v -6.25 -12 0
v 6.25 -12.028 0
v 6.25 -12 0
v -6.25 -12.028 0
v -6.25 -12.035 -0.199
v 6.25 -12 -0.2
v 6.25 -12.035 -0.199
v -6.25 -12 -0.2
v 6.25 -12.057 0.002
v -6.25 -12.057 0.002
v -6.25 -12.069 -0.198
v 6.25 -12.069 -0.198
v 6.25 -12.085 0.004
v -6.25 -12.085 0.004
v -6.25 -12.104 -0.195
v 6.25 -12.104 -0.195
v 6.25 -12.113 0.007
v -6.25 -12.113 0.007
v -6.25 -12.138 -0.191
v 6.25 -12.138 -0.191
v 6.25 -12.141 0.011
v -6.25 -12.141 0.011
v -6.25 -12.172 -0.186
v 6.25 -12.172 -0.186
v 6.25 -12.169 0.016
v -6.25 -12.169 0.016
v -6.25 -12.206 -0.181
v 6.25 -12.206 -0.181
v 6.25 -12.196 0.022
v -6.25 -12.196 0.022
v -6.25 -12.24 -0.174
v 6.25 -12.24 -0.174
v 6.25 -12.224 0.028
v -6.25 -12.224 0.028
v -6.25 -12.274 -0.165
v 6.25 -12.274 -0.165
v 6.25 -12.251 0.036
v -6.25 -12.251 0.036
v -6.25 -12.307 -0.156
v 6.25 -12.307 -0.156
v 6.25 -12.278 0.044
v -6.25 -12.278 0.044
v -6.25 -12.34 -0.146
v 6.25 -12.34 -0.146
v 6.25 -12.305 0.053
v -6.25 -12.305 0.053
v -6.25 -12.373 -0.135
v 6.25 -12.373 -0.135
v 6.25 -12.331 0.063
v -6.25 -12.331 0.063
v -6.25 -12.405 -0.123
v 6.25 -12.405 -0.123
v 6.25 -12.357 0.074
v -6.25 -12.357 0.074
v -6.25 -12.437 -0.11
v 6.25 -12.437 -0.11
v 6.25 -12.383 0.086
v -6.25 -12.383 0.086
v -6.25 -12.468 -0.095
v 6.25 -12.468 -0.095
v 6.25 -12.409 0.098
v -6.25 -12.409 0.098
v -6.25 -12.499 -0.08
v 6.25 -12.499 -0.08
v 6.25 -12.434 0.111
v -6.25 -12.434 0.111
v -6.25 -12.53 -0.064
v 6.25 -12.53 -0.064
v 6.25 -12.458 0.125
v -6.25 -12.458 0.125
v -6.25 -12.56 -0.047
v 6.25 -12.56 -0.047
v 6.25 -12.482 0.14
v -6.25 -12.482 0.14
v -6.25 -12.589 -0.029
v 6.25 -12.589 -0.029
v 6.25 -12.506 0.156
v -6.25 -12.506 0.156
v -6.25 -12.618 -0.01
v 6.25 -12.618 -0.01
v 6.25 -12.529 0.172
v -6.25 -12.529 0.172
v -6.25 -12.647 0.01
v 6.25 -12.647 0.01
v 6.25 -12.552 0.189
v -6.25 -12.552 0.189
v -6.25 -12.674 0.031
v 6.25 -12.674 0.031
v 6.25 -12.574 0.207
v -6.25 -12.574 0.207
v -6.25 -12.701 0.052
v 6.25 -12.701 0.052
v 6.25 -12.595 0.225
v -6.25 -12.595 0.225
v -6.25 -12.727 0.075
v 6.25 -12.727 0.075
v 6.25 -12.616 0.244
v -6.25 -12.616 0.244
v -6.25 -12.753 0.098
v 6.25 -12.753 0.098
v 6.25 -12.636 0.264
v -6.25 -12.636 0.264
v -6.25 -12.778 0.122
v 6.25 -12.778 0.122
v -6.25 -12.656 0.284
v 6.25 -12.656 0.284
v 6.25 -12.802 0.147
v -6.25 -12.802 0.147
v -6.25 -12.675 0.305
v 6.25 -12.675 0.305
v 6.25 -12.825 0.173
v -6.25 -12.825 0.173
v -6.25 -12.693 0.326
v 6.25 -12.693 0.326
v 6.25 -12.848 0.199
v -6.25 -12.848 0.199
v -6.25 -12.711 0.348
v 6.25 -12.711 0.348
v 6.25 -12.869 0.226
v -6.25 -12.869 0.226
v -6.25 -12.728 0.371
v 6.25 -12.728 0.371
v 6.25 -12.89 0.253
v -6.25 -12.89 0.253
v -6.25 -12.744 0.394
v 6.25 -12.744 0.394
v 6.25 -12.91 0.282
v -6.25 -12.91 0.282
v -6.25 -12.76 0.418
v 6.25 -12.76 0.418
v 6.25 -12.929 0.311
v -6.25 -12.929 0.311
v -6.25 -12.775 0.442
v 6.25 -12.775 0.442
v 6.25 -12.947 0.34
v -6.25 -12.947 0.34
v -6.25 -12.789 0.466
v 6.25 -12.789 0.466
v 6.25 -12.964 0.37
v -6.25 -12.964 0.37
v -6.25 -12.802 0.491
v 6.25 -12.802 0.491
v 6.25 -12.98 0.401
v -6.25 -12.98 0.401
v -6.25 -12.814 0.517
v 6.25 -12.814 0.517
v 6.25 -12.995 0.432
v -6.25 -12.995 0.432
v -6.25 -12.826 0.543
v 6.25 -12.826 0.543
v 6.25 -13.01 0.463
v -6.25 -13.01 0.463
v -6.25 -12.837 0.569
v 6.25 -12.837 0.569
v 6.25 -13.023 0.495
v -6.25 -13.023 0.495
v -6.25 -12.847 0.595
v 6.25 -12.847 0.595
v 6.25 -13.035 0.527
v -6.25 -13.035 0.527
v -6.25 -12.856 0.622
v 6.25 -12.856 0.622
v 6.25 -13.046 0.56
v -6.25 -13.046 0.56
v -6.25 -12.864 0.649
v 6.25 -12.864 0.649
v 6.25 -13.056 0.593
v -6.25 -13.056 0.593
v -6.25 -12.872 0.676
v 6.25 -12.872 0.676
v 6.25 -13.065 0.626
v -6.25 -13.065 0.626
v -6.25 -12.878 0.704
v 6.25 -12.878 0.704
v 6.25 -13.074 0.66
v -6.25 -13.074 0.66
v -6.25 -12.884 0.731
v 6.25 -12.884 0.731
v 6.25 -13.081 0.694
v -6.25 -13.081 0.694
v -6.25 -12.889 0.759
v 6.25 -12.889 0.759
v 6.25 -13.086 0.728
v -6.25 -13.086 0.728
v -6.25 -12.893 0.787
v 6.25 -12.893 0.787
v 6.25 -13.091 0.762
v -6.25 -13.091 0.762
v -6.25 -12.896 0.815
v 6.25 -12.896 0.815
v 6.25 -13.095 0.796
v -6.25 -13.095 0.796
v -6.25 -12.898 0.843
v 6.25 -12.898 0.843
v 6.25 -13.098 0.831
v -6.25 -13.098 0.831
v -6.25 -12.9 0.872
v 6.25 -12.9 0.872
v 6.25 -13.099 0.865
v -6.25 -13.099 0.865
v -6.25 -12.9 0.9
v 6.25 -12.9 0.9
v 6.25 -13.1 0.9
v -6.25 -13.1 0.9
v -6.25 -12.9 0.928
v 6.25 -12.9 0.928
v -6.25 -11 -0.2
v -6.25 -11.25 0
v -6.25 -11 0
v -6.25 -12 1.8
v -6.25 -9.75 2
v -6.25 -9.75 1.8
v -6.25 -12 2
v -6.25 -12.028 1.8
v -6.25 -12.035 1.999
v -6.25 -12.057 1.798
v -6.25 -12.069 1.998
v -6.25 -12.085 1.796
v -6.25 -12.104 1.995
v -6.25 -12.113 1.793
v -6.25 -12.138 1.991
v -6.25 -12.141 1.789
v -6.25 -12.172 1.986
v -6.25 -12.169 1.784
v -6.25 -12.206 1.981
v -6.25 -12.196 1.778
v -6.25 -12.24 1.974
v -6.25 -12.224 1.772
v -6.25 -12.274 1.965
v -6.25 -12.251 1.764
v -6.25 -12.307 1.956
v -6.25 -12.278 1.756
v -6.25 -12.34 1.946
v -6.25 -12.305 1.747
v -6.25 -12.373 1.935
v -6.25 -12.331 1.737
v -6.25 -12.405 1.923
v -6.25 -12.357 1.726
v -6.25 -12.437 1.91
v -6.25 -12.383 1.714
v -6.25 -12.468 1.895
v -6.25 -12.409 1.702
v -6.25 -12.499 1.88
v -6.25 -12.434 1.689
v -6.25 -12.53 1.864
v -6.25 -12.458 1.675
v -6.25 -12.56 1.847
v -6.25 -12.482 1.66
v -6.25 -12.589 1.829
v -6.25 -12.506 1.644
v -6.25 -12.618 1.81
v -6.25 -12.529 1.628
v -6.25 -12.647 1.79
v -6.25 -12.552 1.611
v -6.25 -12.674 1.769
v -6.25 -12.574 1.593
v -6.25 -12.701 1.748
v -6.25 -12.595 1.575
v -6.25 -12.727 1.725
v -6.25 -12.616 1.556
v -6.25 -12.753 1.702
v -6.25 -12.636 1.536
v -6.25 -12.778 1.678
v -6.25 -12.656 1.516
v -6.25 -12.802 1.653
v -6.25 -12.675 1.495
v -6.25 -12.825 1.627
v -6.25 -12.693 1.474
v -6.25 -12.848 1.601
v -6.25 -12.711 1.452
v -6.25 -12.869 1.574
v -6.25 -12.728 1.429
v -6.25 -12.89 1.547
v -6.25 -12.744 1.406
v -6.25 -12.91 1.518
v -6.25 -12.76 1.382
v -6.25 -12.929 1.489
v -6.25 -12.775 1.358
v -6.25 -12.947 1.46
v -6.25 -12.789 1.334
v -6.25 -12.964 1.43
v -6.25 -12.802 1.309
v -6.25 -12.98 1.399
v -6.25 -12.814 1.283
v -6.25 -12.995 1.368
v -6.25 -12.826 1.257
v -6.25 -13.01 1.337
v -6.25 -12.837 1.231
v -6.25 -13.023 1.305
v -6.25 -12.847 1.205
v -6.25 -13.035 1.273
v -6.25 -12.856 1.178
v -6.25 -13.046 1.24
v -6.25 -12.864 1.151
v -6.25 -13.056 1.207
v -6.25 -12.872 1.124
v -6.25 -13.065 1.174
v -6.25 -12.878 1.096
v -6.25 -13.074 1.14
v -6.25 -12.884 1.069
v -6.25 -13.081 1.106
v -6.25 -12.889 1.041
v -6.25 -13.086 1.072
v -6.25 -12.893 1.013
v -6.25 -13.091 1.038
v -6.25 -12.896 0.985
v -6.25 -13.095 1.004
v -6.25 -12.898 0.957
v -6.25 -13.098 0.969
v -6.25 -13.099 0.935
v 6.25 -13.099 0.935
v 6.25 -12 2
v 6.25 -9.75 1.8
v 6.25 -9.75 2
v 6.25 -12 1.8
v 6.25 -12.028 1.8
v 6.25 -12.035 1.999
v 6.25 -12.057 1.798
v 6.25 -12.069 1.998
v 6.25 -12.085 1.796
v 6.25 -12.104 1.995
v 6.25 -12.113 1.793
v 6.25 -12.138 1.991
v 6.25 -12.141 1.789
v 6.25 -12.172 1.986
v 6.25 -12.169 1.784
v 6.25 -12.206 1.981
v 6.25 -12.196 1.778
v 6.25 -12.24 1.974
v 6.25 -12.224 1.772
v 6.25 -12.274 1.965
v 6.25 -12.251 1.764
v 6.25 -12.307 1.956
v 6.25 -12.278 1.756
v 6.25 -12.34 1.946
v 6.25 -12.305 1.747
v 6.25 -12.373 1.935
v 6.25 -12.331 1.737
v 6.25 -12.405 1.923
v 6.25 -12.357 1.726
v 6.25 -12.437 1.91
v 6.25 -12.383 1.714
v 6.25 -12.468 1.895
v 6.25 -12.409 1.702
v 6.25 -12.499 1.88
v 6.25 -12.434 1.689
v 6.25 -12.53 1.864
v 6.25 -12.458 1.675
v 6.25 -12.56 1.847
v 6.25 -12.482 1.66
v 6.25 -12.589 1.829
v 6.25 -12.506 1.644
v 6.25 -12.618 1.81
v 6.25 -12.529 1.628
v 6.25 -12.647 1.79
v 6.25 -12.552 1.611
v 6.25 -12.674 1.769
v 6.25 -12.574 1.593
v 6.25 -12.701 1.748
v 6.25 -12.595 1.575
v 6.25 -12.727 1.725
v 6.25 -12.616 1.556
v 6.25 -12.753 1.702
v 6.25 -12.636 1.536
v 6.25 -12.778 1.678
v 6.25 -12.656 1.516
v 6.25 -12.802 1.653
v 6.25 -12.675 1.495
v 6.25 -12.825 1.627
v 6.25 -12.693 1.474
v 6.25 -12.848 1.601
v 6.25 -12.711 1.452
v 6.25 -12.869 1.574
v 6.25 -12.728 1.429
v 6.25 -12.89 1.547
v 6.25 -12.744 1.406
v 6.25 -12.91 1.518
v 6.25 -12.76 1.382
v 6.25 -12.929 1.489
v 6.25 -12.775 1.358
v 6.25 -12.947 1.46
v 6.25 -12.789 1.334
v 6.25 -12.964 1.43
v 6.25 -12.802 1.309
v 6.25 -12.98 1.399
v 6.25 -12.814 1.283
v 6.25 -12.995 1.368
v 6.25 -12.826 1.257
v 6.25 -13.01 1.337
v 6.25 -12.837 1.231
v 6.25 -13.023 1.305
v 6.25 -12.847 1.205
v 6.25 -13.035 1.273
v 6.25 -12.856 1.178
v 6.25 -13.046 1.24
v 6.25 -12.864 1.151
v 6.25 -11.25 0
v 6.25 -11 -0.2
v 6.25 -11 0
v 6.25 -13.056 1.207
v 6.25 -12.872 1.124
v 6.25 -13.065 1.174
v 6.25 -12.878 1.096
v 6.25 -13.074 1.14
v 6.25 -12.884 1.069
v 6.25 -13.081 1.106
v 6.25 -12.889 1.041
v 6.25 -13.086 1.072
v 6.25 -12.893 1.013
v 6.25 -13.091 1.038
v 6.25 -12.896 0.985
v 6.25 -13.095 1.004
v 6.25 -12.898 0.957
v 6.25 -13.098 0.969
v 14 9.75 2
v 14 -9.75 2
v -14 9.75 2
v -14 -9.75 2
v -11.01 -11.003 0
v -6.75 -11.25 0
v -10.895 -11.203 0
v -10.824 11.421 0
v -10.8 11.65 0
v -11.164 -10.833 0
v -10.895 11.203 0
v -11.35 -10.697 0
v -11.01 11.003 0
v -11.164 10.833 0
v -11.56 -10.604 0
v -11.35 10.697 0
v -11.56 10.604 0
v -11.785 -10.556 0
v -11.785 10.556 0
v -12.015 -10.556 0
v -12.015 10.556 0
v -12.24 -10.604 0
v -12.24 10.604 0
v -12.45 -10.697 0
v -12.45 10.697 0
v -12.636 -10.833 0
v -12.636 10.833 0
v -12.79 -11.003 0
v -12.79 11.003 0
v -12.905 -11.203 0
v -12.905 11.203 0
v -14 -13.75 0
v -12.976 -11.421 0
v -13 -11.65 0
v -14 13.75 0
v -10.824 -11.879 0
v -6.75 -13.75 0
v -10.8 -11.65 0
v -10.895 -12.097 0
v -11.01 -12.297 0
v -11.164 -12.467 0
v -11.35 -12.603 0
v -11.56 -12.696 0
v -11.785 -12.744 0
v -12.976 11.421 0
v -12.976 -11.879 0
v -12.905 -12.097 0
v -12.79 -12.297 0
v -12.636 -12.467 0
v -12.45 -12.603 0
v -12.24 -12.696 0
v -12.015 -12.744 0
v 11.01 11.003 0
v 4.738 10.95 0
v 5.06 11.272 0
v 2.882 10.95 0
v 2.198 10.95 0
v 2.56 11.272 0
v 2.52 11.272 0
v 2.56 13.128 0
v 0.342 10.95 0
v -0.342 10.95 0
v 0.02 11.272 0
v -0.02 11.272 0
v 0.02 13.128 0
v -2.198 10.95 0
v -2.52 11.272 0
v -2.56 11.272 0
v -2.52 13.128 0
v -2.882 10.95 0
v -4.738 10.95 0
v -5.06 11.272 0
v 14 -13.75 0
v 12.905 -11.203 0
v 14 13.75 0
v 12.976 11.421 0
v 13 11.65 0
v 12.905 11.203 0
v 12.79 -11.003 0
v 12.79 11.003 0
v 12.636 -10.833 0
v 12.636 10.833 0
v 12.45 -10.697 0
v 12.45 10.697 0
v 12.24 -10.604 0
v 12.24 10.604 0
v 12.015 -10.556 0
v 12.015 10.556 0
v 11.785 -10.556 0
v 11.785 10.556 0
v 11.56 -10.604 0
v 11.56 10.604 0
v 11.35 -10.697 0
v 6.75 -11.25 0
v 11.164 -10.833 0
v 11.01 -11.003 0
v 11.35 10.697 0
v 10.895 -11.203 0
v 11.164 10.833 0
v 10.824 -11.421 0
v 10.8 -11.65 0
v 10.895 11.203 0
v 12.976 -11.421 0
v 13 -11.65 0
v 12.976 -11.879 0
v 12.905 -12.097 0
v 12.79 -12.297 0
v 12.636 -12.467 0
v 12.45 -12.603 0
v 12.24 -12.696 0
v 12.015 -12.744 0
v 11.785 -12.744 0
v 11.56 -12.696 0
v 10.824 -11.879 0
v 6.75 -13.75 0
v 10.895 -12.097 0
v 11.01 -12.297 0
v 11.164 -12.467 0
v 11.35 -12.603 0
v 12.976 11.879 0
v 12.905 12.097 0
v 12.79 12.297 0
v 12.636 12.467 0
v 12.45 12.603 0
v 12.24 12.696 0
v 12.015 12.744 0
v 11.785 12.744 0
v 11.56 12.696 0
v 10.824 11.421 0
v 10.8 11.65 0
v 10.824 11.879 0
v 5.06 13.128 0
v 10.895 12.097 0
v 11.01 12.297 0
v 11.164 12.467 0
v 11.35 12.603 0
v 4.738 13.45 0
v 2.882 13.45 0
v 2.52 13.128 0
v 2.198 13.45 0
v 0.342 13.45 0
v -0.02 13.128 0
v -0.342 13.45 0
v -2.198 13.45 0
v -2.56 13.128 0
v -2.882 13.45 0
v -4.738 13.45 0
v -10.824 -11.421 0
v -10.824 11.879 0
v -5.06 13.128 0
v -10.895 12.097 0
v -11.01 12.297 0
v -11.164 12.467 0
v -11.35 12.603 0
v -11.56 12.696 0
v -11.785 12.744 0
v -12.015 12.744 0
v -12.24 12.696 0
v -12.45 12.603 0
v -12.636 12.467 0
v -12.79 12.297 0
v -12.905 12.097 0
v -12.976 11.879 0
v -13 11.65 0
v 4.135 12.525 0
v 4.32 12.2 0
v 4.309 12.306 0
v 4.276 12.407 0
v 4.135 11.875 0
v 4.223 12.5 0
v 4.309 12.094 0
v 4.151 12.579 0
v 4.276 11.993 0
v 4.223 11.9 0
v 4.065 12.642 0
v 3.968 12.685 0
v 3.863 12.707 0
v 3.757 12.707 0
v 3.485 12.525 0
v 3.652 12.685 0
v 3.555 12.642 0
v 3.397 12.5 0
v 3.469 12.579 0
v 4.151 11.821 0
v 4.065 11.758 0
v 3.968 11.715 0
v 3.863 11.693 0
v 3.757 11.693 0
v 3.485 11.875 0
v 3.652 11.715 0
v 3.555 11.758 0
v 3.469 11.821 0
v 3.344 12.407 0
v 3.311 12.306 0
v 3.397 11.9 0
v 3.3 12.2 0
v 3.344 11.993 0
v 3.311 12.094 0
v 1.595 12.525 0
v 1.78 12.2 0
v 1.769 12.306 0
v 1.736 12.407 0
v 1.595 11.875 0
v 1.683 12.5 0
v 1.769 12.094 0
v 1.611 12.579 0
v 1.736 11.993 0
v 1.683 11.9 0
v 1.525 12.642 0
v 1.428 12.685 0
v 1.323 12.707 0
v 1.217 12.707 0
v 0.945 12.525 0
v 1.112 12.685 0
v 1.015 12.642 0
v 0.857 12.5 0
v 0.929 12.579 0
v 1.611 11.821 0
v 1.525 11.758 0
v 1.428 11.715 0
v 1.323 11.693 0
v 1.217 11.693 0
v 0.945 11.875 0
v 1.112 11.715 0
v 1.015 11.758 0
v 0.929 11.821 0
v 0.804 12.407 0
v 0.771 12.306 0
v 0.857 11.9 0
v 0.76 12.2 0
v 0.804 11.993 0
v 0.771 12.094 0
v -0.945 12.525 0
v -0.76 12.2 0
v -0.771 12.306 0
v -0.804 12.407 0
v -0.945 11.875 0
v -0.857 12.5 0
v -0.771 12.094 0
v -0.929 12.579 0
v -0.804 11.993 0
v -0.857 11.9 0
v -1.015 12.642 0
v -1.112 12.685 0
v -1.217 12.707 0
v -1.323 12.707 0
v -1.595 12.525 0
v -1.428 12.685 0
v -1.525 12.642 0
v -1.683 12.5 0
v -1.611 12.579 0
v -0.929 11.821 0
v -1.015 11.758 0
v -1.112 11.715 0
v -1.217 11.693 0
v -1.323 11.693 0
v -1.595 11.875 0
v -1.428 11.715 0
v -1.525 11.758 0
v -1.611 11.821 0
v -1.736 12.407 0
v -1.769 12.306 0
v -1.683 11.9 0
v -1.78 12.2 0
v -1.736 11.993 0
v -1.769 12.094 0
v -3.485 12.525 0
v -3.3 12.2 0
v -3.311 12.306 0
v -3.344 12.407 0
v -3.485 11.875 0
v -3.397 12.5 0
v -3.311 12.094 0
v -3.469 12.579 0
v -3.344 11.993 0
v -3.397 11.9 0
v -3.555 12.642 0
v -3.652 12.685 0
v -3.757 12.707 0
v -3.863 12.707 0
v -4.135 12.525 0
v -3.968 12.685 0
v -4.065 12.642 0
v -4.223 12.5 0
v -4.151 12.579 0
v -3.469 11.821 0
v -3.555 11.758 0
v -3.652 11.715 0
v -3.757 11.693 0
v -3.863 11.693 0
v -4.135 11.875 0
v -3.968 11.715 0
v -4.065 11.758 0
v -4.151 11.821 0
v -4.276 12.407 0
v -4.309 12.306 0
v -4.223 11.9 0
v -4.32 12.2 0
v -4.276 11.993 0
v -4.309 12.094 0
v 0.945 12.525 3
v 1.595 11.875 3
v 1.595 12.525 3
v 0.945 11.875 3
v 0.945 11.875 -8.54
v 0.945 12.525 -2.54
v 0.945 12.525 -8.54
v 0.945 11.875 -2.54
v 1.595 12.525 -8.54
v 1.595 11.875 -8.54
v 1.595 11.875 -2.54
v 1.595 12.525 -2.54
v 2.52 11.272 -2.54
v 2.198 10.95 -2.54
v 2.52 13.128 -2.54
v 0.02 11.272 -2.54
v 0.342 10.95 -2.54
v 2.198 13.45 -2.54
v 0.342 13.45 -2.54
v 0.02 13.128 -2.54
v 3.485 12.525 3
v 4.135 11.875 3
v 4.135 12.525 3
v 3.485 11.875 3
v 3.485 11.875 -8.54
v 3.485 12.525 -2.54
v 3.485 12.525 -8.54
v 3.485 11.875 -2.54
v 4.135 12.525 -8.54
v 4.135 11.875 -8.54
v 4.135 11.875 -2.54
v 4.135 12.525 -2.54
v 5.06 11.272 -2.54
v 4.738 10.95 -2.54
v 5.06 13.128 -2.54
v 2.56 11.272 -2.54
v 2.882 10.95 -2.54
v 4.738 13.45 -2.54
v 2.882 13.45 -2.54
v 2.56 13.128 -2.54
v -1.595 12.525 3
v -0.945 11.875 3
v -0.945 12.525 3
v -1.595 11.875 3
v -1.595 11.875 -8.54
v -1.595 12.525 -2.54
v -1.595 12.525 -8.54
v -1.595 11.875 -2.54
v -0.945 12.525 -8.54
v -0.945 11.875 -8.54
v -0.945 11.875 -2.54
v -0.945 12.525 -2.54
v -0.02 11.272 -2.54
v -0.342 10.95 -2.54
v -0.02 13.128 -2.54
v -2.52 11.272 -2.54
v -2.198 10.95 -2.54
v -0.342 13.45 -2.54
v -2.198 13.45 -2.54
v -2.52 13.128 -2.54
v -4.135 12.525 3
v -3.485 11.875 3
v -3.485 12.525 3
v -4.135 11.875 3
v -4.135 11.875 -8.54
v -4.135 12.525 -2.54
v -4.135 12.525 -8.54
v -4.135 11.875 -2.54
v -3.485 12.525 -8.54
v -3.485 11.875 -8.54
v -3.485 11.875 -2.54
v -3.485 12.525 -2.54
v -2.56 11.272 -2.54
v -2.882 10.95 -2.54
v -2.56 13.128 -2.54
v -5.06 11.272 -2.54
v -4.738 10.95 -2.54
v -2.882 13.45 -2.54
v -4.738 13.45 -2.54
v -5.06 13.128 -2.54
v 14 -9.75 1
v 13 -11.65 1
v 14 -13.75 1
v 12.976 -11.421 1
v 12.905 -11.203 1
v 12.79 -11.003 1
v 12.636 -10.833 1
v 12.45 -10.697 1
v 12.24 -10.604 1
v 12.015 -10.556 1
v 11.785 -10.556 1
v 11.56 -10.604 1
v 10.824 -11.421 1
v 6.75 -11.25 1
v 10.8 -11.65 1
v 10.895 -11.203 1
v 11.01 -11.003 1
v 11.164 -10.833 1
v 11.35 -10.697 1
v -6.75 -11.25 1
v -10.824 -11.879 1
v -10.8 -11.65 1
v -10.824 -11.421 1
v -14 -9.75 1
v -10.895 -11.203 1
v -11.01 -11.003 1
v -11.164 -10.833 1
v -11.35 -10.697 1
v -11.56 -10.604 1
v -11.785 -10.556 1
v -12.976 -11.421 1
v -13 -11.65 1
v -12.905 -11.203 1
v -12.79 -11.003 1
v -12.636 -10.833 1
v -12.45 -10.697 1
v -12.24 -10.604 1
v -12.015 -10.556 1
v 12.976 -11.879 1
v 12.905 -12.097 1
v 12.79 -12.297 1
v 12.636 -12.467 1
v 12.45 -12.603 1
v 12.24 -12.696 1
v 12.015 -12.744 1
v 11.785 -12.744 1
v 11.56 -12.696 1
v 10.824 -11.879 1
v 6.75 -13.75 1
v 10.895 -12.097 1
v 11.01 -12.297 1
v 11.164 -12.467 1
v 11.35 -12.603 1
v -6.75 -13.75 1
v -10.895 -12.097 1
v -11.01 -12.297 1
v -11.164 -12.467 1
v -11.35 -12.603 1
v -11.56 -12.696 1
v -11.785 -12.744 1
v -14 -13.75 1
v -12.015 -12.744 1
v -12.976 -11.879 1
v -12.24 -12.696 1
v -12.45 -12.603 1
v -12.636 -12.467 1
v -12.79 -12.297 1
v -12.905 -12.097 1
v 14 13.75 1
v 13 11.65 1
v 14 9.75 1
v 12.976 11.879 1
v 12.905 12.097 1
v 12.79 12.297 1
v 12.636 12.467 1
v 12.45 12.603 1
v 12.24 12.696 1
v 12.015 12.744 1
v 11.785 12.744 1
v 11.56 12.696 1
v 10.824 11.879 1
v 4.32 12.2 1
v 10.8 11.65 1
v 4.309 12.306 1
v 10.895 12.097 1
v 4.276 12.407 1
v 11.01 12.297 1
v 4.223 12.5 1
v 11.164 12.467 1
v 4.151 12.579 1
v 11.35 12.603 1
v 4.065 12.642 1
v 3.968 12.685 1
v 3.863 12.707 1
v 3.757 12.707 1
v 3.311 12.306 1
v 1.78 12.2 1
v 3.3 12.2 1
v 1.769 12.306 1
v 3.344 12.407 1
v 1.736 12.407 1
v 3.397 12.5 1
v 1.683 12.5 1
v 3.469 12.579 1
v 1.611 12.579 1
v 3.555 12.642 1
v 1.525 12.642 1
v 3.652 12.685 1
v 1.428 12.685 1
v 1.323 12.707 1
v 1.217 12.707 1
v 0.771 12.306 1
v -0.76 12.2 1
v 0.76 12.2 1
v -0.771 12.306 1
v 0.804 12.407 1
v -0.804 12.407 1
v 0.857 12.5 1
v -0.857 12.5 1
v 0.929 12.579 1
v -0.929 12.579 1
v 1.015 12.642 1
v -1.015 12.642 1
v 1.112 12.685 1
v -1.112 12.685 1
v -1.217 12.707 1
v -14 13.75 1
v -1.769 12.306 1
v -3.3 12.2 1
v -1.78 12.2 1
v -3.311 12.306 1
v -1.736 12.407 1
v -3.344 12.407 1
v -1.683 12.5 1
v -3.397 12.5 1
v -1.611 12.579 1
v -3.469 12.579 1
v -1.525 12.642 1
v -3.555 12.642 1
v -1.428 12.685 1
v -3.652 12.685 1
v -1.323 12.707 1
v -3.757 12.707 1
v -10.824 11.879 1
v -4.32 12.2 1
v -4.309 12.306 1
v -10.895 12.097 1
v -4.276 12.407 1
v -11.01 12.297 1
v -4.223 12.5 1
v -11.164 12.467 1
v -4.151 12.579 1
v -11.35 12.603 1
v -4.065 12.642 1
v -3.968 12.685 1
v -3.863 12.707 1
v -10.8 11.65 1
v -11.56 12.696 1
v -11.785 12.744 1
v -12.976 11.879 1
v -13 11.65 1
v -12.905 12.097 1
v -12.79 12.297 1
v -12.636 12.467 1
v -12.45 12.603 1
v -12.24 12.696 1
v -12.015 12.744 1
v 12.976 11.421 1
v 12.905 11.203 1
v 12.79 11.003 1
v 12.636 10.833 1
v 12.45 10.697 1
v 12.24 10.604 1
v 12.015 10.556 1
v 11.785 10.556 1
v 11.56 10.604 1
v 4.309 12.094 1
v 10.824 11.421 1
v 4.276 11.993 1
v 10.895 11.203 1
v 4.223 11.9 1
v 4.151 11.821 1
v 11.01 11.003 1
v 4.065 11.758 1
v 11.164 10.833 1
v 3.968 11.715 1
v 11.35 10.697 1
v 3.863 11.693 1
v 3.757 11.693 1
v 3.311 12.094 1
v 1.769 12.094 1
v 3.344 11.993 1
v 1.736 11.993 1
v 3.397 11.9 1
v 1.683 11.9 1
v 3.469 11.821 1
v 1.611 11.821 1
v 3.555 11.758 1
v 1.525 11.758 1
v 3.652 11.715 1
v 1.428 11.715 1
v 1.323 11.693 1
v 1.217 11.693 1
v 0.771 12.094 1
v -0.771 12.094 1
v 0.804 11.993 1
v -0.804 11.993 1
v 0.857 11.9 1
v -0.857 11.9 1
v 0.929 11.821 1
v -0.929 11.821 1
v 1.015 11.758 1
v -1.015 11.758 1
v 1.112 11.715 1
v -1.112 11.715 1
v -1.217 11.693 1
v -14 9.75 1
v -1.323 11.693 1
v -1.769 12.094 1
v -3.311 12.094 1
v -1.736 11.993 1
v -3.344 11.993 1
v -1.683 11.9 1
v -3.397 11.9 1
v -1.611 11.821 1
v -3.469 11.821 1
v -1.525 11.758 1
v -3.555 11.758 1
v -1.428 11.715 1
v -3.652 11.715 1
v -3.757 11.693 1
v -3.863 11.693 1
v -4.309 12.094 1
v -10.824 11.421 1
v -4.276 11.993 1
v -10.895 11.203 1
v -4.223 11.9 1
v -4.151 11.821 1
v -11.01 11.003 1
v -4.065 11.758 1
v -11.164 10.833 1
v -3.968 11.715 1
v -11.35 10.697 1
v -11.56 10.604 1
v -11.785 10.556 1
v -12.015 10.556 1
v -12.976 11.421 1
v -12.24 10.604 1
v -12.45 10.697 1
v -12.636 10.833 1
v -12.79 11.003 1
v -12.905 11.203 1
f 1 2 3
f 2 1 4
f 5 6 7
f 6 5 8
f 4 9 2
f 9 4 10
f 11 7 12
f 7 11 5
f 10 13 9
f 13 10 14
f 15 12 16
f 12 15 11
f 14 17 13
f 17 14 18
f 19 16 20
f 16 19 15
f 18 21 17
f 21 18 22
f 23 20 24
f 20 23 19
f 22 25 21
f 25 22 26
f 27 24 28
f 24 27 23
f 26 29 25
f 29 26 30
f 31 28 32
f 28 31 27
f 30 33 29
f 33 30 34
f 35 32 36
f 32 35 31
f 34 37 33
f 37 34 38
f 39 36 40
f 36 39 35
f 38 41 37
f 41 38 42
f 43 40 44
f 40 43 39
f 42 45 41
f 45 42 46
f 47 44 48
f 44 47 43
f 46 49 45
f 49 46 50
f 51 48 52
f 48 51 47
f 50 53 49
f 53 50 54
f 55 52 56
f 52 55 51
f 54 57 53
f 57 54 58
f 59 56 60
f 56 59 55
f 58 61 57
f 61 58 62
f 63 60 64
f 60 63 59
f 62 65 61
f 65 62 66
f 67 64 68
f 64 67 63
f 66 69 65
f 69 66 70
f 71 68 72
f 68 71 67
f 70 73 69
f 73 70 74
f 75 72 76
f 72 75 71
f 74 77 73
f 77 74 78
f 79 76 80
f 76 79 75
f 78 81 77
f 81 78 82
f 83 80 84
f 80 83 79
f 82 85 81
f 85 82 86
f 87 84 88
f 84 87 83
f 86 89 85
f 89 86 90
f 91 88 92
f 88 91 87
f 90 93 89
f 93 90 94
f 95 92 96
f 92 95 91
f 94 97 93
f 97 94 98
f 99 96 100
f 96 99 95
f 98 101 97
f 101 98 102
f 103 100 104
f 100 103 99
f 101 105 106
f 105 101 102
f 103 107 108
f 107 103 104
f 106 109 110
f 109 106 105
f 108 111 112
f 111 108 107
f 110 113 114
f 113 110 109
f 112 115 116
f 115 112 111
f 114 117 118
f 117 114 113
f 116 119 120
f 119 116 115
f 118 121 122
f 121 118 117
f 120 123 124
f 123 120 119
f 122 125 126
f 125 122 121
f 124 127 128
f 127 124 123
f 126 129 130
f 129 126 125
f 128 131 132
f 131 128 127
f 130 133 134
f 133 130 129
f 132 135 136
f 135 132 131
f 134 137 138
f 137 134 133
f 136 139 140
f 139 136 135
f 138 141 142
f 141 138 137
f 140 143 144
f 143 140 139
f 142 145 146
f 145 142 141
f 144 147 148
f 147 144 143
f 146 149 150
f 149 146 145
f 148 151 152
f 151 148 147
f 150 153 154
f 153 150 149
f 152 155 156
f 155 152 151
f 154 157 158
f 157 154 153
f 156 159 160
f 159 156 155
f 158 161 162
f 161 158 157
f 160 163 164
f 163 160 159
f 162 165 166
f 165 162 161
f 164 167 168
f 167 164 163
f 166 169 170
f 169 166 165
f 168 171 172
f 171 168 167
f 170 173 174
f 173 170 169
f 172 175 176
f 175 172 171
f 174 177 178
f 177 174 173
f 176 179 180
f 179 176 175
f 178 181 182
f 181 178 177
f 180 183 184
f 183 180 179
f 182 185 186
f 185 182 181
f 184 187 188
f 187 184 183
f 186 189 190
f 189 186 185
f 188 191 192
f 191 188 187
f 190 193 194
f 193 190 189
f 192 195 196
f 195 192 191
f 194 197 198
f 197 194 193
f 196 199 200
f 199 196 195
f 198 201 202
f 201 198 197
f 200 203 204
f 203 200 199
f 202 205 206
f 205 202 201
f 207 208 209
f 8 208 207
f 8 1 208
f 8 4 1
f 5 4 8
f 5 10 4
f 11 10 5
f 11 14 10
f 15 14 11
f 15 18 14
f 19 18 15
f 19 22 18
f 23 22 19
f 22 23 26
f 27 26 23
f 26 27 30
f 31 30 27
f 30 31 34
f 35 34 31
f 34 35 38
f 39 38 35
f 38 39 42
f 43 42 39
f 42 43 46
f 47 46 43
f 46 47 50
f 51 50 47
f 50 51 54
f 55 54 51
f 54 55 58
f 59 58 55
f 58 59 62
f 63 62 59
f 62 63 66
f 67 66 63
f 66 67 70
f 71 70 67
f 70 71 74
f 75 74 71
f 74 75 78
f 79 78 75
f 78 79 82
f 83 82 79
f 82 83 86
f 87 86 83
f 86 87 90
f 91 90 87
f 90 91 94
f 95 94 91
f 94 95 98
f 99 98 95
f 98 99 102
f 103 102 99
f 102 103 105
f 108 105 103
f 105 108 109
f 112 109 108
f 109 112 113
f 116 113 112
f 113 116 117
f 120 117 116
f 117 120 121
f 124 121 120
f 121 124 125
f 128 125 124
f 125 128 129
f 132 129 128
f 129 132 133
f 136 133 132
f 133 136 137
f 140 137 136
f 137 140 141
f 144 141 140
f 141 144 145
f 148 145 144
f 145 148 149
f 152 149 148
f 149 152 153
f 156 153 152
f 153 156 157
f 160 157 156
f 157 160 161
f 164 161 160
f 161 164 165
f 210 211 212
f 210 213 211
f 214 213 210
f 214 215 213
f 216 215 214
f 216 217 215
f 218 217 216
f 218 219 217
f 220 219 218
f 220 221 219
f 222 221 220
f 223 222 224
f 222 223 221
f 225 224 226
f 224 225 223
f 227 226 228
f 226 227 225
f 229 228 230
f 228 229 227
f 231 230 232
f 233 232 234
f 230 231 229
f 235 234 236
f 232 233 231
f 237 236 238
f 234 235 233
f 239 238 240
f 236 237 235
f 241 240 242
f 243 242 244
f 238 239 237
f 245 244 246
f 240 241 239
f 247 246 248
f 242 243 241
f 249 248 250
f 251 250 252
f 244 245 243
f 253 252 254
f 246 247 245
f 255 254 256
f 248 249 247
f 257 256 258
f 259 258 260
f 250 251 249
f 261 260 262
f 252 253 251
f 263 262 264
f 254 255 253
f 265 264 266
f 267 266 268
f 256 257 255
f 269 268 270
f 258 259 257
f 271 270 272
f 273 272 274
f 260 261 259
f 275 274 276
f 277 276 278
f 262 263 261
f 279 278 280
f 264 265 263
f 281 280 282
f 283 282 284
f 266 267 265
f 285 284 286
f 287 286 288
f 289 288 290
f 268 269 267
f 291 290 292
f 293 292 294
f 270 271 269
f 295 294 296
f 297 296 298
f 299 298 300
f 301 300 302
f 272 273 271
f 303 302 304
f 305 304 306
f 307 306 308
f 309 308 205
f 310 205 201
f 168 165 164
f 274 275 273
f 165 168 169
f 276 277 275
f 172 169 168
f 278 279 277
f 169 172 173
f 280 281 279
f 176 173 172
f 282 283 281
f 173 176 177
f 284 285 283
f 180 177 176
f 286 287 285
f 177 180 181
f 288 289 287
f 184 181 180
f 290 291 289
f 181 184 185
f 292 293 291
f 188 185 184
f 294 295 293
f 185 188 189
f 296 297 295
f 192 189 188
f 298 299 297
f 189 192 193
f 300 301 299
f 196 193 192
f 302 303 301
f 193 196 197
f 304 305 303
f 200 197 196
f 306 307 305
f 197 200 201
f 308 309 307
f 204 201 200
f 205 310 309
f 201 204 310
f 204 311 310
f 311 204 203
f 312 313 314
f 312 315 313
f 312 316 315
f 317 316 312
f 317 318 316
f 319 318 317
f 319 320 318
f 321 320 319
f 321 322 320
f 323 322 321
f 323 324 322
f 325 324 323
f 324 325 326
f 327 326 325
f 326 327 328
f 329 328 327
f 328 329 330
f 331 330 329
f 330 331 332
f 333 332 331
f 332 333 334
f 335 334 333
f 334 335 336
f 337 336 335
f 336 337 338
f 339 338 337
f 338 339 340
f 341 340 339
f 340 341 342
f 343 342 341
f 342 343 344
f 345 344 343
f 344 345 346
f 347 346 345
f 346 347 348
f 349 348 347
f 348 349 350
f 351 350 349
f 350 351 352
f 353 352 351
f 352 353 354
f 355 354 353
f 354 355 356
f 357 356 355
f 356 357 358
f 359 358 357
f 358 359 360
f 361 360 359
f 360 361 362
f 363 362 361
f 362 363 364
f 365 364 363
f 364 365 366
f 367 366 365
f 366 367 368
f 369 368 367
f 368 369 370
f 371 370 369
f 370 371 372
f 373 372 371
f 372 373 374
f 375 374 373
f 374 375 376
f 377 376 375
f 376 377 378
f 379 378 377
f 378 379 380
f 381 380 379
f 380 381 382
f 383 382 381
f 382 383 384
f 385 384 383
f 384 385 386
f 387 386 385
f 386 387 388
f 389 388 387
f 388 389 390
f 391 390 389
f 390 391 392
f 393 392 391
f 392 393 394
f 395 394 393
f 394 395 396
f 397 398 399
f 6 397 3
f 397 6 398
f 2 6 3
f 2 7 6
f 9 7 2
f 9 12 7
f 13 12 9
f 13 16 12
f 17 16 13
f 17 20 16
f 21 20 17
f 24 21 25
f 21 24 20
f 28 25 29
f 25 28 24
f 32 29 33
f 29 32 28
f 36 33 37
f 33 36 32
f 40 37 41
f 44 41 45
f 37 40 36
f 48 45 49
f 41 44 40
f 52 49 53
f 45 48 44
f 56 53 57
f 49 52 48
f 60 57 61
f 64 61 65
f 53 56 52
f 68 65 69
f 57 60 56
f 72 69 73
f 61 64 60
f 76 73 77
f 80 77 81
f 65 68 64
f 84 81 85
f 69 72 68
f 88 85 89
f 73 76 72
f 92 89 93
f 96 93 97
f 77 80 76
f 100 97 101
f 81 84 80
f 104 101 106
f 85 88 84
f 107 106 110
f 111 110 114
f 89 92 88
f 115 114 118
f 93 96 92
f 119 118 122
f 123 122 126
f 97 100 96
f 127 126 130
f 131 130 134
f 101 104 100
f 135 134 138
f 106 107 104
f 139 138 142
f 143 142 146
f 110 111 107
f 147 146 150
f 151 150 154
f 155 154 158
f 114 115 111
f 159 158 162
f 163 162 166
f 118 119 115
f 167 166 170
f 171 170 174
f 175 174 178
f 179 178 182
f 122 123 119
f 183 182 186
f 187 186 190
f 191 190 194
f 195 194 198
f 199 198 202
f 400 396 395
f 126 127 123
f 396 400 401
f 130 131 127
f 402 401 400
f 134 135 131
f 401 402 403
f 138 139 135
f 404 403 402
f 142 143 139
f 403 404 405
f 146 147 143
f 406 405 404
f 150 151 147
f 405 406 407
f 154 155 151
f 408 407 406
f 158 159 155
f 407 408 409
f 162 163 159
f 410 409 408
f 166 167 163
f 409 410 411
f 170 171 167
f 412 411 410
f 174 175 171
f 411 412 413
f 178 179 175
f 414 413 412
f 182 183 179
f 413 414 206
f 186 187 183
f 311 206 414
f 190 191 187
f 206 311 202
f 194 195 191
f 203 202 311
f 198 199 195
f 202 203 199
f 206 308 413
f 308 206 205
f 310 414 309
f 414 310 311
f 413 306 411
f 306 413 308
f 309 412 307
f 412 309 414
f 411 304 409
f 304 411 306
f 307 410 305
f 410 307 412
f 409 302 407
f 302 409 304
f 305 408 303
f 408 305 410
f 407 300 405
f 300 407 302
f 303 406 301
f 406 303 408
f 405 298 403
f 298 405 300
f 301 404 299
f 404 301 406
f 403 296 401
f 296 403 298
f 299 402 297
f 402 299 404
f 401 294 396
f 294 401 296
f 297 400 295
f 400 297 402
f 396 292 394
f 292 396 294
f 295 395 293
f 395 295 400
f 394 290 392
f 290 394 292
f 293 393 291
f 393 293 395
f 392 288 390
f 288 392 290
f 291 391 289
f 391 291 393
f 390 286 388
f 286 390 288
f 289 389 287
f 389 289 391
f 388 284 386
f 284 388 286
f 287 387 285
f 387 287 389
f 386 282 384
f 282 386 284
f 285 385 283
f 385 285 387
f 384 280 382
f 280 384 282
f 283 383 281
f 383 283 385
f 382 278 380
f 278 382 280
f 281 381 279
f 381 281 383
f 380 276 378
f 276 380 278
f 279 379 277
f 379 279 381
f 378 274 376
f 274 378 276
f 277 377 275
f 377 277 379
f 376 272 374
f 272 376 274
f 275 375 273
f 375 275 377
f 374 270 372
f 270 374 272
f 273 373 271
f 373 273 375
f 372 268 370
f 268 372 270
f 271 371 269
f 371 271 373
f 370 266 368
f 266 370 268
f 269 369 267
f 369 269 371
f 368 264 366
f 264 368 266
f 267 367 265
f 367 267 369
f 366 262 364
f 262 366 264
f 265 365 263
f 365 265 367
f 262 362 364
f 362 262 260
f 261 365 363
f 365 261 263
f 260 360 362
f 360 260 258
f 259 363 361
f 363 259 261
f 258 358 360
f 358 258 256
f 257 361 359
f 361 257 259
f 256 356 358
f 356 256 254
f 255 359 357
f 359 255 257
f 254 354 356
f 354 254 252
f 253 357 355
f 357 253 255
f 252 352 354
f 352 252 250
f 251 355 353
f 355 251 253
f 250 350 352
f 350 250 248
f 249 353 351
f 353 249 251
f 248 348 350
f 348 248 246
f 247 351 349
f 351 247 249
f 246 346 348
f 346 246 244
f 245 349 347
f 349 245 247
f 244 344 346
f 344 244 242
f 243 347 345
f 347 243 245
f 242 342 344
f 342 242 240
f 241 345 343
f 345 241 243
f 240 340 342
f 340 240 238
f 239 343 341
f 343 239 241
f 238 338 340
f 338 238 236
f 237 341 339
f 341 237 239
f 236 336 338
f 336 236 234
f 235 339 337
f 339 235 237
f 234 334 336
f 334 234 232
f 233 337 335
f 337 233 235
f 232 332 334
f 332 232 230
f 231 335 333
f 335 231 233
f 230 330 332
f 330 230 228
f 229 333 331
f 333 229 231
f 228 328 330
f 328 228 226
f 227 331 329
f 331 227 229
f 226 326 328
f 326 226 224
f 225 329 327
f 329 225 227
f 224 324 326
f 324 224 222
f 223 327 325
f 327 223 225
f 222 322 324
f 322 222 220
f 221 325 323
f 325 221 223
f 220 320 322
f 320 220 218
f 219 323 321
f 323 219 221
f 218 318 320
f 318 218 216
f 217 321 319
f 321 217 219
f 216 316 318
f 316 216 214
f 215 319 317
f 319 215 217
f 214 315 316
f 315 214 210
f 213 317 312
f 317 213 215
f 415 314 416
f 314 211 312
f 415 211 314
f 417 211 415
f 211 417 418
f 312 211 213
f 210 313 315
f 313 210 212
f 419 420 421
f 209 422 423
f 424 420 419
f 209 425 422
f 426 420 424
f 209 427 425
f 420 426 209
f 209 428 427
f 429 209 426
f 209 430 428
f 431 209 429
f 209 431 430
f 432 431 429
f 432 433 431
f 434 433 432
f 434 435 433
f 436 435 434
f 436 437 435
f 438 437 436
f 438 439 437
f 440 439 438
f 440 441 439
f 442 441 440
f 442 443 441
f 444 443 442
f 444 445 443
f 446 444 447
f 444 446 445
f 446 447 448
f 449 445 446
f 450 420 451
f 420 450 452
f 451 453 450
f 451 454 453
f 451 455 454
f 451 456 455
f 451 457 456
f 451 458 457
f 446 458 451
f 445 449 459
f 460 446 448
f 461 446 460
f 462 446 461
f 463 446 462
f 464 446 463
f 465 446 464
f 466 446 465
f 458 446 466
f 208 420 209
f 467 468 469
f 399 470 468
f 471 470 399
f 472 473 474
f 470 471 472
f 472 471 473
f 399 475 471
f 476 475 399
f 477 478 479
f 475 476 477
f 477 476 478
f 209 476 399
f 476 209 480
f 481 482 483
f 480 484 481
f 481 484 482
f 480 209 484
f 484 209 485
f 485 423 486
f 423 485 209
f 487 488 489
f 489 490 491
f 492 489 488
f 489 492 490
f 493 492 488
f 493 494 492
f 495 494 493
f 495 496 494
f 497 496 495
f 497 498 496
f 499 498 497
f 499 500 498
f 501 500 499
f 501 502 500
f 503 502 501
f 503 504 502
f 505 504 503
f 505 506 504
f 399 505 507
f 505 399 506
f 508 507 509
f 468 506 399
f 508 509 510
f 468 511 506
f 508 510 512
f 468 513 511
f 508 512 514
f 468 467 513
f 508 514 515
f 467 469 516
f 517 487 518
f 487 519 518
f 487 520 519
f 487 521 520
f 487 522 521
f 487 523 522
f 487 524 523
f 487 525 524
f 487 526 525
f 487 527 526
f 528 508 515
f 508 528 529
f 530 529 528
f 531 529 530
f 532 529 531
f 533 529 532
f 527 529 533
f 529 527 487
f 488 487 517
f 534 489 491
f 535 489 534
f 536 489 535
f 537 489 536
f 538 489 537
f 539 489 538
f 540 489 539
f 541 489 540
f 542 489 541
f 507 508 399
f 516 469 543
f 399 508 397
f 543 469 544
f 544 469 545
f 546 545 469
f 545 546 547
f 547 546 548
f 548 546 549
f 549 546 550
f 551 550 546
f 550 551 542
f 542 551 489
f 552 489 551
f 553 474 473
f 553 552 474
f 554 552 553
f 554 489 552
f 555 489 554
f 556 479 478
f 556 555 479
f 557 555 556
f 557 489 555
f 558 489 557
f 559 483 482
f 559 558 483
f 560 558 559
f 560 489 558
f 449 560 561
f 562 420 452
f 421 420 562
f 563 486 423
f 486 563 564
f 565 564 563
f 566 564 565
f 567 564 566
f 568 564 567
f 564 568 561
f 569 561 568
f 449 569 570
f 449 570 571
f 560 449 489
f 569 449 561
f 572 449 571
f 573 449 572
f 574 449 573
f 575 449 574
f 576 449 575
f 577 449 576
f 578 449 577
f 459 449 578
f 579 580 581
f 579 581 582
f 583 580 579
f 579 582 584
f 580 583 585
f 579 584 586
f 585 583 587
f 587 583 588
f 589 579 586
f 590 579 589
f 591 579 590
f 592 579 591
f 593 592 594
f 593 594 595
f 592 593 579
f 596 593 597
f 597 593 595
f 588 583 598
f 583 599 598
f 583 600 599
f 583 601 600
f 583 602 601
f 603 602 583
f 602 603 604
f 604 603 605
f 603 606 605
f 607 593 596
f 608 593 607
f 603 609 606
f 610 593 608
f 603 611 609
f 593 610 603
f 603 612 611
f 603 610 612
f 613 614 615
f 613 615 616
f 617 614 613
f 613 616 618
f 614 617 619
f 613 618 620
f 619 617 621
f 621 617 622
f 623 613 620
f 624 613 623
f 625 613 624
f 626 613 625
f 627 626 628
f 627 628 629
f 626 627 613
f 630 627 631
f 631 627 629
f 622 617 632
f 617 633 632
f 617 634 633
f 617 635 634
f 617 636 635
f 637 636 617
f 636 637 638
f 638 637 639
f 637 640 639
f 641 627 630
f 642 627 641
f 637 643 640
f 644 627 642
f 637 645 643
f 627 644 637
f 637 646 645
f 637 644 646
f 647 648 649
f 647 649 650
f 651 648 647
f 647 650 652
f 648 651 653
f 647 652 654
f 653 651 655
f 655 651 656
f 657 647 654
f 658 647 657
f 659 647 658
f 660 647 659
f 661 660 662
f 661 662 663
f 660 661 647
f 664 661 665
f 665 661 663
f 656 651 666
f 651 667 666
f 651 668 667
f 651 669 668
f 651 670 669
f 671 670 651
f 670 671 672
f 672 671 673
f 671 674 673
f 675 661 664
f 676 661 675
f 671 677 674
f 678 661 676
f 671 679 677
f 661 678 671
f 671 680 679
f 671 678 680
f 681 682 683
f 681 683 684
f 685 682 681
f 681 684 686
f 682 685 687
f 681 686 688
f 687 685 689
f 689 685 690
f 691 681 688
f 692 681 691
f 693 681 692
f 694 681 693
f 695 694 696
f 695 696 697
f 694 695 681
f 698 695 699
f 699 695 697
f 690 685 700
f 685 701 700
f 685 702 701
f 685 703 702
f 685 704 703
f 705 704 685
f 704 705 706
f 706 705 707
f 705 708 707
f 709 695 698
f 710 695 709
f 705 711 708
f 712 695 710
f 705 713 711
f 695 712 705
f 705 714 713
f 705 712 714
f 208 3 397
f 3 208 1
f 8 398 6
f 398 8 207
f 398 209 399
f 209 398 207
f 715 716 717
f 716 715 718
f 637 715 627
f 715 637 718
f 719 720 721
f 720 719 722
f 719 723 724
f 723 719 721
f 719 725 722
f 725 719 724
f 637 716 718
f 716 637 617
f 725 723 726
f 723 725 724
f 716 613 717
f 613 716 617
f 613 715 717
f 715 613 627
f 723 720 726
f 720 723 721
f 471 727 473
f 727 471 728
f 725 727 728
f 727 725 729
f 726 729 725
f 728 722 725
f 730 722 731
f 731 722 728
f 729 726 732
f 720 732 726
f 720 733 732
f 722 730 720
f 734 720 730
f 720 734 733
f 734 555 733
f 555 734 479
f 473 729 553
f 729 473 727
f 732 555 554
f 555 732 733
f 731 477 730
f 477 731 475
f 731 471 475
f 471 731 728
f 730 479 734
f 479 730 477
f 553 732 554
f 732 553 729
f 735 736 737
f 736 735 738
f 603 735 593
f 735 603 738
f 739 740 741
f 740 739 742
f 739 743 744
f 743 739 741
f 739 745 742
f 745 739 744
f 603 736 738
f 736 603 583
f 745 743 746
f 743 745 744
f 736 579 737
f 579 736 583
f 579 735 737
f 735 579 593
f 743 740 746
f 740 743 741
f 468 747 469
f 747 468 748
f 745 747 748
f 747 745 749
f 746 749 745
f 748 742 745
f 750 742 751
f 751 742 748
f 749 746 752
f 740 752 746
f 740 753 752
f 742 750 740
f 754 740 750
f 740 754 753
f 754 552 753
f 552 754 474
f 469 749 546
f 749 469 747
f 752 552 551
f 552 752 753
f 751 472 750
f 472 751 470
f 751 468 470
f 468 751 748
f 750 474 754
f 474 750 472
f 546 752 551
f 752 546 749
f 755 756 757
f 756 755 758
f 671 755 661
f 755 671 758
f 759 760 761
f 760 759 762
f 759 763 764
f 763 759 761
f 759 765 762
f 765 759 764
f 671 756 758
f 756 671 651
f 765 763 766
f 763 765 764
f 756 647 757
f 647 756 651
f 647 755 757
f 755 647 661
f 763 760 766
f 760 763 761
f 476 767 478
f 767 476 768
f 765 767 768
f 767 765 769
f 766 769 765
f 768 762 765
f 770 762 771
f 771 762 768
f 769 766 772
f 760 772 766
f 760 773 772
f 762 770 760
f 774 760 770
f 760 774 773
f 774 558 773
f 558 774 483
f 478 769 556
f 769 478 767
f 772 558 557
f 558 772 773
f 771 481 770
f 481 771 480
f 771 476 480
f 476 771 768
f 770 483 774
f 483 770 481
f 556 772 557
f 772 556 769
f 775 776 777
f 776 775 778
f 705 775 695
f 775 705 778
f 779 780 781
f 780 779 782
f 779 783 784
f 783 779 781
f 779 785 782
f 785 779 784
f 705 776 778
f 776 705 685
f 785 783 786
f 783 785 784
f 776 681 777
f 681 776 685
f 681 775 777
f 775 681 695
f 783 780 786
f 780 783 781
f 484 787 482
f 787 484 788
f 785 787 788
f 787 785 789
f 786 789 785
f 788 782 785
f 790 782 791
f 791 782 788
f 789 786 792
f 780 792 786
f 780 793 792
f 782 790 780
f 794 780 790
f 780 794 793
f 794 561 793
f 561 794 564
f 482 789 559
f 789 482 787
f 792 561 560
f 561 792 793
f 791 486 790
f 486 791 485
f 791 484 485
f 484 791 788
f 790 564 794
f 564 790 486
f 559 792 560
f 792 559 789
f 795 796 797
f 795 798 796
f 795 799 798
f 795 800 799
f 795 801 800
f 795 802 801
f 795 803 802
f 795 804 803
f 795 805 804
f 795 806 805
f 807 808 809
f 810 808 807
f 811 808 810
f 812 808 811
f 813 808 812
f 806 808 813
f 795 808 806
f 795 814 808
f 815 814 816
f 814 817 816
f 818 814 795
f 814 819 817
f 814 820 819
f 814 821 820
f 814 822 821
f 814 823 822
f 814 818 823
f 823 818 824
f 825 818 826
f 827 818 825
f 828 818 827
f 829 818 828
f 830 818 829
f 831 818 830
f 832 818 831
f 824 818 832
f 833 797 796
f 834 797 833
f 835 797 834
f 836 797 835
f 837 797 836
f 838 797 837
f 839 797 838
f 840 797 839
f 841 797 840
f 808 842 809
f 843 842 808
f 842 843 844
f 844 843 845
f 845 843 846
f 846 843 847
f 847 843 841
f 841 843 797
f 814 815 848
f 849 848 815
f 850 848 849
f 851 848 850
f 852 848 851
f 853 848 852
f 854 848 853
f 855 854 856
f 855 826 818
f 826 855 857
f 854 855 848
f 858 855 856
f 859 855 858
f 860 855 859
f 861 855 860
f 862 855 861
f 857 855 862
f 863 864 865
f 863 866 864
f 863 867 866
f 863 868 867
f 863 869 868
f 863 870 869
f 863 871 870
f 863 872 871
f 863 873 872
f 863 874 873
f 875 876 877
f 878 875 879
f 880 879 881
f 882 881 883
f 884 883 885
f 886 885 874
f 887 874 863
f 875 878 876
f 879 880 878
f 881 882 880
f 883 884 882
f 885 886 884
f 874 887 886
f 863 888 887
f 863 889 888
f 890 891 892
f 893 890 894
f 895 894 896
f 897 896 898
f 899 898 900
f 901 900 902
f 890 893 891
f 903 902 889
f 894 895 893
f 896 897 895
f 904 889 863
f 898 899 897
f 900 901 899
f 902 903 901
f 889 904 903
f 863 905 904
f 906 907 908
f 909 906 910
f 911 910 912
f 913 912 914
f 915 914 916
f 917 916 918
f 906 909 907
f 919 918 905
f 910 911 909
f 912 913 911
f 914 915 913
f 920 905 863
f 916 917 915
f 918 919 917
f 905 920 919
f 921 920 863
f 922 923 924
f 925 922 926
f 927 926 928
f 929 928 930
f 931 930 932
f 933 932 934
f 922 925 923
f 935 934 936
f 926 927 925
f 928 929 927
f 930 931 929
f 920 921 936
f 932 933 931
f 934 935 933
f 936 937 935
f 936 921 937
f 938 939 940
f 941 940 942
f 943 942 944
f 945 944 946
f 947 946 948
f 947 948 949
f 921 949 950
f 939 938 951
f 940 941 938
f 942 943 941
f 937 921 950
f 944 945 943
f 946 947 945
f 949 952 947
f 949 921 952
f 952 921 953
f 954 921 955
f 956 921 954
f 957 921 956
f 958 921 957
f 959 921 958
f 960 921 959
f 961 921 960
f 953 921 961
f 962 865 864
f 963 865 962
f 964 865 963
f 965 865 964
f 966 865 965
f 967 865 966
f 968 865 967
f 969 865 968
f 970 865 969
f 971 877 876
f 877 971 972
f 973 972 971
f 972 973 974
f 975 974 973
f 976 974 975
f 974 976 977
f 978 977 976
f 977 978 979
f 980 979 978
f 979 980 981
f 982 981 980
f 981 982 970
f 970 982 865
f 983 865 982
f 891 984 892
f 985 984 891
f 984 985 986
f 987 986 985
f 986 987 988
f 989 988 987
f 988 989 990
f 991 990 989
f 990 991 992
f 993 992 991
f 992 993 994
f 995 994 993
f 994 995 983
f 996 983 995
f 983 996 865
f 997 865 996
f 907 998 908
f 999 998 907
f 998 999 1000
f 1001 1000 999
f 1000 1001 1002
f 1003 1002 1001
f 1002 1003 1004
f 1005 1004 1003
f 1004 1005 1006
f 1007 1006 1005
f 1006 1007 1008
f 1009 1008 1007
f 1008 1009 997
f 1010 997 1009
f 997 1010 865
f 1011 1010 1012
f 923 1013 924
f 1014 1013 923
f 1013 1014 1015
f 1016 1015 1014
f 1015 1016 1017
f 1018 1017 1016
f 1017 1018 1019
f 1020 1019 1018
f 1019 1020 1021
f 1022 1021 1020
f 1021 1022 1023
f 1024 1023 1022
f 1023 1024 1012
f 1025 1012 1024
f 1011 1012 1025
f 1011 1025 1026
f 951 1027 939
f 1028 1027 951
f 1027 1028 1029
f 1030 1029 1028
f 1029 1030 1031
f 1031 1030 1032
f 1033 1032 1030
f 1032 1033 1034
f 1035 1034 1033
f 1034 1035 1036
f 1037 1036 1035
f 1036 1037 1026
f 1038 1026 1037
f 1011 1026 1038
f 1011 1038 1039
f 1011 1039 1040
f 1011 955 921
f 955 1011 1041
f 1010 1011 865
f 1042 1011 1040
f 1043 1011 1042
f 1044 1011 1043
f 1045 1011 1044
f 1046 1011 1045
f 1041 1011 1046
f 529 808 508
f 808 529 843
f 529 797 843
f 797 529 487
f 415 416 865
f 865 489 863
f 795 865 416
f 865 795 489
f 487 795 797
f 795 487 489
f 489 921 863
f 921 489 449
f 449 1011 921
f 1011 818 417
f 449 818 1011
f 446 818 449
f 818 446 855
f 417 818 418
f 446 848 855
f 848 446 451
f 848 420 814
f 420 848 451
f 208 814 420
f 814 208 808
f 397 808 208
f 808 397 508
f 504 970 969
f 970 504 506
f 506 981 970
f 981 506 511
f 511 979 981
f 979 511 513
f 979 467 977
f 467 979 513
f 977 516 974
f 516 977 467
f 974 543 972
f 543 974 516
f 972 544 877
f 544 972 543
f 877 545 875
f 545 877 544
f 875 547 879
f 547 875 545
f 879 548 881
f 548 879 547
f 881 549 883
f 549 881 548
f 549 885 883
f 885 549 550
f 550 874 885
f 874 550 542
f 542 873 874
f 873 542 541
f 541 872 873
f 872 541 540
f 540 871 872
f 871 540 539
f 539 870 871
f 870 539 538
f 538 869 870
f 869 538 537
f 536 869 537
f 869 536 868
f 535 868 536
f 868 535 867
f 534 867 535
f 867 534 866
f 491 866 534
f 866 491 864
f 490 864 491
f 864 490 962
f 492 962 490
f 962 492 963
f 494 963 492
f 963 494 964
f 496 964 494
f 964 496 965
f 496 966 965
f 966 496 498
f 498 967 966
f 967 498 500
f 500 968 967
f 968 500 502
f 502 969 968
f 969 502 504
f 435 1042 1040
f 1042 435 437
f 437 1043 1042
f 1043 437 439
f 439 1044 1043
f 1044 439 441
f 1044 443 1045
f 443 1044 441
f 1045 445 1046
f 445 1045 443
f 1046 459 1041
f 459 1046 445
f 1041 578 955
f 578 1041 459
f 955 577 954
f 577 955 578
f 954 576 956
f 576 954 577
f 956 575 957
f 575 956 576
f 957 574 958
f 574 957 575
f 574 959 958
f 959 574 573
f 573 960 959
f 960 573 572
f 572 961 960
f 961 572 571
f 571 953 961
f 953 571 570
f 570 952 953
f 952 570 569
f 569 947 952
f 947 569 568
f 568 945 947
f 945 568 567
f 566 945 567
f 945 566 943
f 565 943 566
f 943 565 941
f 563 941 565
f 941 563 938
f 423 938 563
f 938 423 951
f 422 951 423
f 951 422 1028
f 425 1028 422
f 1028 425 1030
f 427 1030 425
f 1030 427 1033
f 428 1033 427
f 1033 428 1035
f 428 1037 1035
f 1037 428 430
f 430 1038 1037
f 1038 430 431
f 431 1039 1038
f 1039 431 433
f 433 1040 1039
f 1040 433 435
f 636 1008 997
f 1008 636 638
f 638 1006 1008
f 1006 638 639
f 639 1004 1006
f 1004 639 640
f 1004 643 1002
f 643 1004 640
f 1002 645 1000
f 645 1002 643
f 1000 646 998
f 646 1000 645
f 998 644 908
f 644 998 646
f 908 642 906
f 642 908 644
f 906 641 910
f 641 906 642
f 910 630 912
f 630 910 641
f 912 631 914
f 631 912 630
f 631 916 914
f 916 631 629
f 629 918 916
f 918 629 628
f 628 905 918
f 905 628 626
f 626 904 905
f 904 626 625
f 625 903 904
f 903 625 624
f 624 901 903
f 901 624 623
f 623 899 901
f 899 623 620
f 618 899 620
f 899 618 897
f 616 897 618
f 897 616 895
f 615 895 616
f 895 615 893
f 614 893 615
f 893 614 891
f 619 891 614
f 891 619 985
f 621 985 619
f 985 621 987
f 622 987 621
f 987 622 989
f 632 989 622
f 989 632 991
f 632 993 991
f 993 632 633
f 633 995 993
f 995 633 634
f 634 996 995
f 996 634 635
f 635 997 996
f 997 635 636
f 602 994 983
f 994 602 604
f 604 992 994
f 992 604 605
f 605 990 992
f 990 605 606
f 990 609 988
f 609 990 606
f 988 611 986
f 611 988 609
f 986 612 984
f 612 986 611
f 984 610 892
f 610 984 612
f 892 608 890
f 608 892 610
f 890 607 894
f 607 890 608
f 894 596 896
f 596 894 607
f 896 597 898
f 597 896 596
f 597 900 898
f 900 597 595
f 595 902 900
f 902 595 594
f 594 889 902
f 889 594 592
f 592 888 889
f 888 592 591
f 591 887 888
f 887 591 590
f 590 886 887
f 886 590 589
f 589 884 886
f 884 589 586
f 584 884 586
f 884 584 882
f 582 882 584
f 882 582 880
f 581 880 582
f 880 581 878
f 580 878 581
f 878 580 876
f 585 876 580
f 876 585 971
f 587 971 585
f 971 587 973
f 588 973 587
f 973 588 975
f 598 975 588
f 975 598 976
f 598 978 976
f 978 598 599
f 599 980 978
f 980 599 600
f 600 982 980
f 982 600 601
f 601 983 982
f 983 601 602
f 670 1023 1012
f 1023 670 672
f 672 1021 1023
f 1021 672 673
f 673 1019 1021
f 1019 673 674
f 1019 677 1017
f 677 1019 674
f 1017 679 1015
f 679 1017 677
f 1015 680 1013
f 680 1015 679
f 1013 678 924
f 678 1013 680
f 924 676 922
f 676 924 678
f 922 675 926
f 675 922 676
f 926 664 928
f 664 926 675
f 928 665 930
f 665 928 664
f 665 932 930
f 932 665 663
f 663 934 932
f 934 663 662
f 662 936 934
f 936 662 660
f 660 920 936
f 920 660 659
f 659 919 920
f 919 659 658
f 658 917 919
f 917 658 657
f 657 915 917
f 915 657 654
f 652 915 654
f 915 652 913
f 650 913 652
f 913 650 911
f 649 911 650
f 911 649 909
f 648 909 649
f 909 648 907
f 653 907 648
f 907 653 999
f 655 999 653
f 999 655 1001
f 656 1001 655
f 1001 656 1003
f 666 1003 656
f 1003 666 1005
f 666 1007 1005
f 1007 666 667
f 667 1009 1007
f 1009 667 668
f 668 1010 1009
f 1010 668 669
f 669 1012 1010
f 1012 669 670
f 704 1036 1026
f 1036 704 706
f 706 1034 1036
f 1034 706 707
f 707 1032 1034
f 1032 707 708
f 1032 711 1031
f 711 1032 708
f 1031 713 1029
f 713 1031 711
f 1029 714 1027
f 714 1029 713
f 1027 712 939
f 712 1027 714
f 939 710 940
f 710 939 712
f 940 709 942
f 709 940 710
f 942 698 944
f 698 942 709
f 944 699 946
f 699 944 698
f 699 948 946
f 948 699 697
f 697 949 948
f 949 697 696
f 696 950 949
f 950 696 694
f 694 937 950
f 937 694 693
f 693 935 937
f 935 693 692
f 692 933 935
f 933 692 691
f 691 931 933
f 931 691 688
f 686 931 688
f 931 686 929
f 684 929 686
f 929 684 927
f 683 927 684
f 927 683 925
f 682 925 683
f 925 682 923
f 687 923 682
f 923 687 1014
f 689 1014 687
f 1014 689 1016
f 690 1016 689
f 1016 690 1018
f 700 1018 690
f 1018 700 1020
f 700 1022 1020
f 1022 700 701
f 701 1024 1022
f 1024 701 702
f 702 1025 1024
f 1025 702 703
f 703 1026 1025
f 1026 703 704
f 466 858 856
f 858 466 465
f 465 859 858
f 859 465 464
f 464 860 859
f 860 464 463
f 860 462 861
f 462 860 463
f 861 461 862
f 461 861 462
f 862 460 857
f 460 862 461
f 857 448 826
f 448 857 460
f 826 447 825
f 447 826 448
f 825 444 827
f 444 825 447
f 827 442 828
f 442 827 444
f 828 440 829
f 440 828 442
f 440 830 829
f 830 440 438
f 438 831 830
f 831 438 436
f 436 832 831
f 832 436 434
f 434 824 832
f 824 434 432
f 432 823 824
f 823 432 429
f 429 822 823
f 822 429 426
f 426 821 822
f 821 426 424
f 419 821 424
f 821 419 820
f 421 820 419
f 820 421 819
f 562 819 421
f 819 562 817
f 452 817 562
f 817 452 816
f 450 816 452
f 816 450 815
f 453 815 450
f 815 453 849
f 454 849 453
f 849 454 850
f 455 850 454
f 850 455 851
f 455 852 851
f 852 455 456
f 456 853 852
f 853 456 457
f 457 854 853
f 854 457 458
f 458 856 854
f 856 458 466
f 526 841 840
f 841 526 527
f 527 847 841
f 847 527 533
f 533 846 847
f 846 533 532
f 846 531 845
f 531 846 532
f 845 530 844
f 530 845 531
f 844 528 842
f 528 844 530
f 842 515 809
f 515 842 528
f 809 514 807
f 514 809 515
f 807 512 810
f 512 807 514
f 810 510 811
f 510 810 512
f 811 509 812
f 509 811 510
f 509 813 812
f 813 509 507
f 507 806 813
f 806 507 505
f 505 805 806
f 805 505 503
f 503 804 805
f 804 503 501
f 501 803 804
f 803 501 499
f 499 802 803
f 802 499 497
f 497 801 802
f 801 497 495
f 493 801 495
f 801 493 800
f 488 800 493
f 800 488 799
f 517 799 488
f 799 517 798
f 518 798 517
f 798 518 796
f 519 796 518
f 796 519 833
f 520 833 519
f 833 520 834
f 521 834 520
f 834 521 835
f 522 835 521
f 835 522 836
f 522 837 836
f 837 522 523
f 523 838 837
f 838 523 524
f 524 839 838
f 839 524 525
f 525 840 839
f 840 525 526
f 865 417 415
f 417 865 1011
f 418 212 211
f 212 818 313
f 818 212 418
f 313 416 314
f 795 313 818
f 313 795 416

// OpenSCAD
module screw(){
    circle(d=2.2,$fn=30);
}

module pcb(){
    color("SteelBlue") linear_extrude(height=1) difference(){

            square([28,27.5],center=true);
            translate([0,-12.5]) square([13.5,2.5],center=true);
        translate([28/2-2.1,27.5/2-2.1]) screw();
        translate([-28/2+2.1,-27.5/2+2.1]) screw();
        translate([-28/2+2.1,27.5/2-2.1]) screw();
        translate([28/2-2.1,-27.5/2+2.1]) screw();
        
        translate([2.54/2,23.2/2+0.6]) circle(d=1.02,$fn=30);
        translate([2.54*3/2,23.2/2+0.6]) circle(d=1.02,$fn=30);
        translate([-2.54/2,23.2/2+0.6]) circle(d=1.02,$fn=30);
        translate([-2.54*3/2,23.2/2+0.6]) circle(d=1.02,$fn=30);
        
    }
}

module screen(){
color("Black") linear_extrude(height=1) square([28,19.5],center=true);
}

module cable(){
    color("black") union(){
translate([0,-12,0.9]) rotate([0,90,180])rotate_extrude(angle=180,$fn=200)translate([1,0])rotate([0,0,90]) square([12.5,0.2],center=true);
    
    translate([-6.25,-12,1.8]) cube([12.5,7,0.2]);
    translate([-6.25,-12,-0.2]) cube([12.5,1,0.2]);
    }
}
module pin(){
color("Silver") linear_extrude(height=11.54) square([0.65,0.65],center=true);
color("Black")translate([0,0,3]) linear_extrude(height=2.54) difference(){
        square([2.5,2.5],center=true);
            rotate([0,0,45]) translate([2.54,0]) square([2,2],center=true);
            rotate([0,0,135]) translate([2.54,0]) square([2,2],center=true);
            rotate([0,0,225]) translate([2.54,0]) square([2,2],center=true);
            rotate([0,0,315]) translate([2.54,0]) square([2,2],center=true);
    }
}

module SSD1306(pin=0){
pcb();
translate([0,0,1]) screen();
    cable();
    if (pin==1){
 translate([2.54/2,23.2/2+0.6,3]) rotate([180,0,0]) pin();
 translate([2.54*3/2,23.2/2+0.6,3]) rotate([180,0,0]) pin();
 translate([-2.54/2,23.2/2+0.6,3]) rotate([180,0,0]) pin();
 translate([-2.54*3/2,23.2/2+0.6,3]) rotate([180,0,0])pin();
        }
}


SSD1306(pin=1);
